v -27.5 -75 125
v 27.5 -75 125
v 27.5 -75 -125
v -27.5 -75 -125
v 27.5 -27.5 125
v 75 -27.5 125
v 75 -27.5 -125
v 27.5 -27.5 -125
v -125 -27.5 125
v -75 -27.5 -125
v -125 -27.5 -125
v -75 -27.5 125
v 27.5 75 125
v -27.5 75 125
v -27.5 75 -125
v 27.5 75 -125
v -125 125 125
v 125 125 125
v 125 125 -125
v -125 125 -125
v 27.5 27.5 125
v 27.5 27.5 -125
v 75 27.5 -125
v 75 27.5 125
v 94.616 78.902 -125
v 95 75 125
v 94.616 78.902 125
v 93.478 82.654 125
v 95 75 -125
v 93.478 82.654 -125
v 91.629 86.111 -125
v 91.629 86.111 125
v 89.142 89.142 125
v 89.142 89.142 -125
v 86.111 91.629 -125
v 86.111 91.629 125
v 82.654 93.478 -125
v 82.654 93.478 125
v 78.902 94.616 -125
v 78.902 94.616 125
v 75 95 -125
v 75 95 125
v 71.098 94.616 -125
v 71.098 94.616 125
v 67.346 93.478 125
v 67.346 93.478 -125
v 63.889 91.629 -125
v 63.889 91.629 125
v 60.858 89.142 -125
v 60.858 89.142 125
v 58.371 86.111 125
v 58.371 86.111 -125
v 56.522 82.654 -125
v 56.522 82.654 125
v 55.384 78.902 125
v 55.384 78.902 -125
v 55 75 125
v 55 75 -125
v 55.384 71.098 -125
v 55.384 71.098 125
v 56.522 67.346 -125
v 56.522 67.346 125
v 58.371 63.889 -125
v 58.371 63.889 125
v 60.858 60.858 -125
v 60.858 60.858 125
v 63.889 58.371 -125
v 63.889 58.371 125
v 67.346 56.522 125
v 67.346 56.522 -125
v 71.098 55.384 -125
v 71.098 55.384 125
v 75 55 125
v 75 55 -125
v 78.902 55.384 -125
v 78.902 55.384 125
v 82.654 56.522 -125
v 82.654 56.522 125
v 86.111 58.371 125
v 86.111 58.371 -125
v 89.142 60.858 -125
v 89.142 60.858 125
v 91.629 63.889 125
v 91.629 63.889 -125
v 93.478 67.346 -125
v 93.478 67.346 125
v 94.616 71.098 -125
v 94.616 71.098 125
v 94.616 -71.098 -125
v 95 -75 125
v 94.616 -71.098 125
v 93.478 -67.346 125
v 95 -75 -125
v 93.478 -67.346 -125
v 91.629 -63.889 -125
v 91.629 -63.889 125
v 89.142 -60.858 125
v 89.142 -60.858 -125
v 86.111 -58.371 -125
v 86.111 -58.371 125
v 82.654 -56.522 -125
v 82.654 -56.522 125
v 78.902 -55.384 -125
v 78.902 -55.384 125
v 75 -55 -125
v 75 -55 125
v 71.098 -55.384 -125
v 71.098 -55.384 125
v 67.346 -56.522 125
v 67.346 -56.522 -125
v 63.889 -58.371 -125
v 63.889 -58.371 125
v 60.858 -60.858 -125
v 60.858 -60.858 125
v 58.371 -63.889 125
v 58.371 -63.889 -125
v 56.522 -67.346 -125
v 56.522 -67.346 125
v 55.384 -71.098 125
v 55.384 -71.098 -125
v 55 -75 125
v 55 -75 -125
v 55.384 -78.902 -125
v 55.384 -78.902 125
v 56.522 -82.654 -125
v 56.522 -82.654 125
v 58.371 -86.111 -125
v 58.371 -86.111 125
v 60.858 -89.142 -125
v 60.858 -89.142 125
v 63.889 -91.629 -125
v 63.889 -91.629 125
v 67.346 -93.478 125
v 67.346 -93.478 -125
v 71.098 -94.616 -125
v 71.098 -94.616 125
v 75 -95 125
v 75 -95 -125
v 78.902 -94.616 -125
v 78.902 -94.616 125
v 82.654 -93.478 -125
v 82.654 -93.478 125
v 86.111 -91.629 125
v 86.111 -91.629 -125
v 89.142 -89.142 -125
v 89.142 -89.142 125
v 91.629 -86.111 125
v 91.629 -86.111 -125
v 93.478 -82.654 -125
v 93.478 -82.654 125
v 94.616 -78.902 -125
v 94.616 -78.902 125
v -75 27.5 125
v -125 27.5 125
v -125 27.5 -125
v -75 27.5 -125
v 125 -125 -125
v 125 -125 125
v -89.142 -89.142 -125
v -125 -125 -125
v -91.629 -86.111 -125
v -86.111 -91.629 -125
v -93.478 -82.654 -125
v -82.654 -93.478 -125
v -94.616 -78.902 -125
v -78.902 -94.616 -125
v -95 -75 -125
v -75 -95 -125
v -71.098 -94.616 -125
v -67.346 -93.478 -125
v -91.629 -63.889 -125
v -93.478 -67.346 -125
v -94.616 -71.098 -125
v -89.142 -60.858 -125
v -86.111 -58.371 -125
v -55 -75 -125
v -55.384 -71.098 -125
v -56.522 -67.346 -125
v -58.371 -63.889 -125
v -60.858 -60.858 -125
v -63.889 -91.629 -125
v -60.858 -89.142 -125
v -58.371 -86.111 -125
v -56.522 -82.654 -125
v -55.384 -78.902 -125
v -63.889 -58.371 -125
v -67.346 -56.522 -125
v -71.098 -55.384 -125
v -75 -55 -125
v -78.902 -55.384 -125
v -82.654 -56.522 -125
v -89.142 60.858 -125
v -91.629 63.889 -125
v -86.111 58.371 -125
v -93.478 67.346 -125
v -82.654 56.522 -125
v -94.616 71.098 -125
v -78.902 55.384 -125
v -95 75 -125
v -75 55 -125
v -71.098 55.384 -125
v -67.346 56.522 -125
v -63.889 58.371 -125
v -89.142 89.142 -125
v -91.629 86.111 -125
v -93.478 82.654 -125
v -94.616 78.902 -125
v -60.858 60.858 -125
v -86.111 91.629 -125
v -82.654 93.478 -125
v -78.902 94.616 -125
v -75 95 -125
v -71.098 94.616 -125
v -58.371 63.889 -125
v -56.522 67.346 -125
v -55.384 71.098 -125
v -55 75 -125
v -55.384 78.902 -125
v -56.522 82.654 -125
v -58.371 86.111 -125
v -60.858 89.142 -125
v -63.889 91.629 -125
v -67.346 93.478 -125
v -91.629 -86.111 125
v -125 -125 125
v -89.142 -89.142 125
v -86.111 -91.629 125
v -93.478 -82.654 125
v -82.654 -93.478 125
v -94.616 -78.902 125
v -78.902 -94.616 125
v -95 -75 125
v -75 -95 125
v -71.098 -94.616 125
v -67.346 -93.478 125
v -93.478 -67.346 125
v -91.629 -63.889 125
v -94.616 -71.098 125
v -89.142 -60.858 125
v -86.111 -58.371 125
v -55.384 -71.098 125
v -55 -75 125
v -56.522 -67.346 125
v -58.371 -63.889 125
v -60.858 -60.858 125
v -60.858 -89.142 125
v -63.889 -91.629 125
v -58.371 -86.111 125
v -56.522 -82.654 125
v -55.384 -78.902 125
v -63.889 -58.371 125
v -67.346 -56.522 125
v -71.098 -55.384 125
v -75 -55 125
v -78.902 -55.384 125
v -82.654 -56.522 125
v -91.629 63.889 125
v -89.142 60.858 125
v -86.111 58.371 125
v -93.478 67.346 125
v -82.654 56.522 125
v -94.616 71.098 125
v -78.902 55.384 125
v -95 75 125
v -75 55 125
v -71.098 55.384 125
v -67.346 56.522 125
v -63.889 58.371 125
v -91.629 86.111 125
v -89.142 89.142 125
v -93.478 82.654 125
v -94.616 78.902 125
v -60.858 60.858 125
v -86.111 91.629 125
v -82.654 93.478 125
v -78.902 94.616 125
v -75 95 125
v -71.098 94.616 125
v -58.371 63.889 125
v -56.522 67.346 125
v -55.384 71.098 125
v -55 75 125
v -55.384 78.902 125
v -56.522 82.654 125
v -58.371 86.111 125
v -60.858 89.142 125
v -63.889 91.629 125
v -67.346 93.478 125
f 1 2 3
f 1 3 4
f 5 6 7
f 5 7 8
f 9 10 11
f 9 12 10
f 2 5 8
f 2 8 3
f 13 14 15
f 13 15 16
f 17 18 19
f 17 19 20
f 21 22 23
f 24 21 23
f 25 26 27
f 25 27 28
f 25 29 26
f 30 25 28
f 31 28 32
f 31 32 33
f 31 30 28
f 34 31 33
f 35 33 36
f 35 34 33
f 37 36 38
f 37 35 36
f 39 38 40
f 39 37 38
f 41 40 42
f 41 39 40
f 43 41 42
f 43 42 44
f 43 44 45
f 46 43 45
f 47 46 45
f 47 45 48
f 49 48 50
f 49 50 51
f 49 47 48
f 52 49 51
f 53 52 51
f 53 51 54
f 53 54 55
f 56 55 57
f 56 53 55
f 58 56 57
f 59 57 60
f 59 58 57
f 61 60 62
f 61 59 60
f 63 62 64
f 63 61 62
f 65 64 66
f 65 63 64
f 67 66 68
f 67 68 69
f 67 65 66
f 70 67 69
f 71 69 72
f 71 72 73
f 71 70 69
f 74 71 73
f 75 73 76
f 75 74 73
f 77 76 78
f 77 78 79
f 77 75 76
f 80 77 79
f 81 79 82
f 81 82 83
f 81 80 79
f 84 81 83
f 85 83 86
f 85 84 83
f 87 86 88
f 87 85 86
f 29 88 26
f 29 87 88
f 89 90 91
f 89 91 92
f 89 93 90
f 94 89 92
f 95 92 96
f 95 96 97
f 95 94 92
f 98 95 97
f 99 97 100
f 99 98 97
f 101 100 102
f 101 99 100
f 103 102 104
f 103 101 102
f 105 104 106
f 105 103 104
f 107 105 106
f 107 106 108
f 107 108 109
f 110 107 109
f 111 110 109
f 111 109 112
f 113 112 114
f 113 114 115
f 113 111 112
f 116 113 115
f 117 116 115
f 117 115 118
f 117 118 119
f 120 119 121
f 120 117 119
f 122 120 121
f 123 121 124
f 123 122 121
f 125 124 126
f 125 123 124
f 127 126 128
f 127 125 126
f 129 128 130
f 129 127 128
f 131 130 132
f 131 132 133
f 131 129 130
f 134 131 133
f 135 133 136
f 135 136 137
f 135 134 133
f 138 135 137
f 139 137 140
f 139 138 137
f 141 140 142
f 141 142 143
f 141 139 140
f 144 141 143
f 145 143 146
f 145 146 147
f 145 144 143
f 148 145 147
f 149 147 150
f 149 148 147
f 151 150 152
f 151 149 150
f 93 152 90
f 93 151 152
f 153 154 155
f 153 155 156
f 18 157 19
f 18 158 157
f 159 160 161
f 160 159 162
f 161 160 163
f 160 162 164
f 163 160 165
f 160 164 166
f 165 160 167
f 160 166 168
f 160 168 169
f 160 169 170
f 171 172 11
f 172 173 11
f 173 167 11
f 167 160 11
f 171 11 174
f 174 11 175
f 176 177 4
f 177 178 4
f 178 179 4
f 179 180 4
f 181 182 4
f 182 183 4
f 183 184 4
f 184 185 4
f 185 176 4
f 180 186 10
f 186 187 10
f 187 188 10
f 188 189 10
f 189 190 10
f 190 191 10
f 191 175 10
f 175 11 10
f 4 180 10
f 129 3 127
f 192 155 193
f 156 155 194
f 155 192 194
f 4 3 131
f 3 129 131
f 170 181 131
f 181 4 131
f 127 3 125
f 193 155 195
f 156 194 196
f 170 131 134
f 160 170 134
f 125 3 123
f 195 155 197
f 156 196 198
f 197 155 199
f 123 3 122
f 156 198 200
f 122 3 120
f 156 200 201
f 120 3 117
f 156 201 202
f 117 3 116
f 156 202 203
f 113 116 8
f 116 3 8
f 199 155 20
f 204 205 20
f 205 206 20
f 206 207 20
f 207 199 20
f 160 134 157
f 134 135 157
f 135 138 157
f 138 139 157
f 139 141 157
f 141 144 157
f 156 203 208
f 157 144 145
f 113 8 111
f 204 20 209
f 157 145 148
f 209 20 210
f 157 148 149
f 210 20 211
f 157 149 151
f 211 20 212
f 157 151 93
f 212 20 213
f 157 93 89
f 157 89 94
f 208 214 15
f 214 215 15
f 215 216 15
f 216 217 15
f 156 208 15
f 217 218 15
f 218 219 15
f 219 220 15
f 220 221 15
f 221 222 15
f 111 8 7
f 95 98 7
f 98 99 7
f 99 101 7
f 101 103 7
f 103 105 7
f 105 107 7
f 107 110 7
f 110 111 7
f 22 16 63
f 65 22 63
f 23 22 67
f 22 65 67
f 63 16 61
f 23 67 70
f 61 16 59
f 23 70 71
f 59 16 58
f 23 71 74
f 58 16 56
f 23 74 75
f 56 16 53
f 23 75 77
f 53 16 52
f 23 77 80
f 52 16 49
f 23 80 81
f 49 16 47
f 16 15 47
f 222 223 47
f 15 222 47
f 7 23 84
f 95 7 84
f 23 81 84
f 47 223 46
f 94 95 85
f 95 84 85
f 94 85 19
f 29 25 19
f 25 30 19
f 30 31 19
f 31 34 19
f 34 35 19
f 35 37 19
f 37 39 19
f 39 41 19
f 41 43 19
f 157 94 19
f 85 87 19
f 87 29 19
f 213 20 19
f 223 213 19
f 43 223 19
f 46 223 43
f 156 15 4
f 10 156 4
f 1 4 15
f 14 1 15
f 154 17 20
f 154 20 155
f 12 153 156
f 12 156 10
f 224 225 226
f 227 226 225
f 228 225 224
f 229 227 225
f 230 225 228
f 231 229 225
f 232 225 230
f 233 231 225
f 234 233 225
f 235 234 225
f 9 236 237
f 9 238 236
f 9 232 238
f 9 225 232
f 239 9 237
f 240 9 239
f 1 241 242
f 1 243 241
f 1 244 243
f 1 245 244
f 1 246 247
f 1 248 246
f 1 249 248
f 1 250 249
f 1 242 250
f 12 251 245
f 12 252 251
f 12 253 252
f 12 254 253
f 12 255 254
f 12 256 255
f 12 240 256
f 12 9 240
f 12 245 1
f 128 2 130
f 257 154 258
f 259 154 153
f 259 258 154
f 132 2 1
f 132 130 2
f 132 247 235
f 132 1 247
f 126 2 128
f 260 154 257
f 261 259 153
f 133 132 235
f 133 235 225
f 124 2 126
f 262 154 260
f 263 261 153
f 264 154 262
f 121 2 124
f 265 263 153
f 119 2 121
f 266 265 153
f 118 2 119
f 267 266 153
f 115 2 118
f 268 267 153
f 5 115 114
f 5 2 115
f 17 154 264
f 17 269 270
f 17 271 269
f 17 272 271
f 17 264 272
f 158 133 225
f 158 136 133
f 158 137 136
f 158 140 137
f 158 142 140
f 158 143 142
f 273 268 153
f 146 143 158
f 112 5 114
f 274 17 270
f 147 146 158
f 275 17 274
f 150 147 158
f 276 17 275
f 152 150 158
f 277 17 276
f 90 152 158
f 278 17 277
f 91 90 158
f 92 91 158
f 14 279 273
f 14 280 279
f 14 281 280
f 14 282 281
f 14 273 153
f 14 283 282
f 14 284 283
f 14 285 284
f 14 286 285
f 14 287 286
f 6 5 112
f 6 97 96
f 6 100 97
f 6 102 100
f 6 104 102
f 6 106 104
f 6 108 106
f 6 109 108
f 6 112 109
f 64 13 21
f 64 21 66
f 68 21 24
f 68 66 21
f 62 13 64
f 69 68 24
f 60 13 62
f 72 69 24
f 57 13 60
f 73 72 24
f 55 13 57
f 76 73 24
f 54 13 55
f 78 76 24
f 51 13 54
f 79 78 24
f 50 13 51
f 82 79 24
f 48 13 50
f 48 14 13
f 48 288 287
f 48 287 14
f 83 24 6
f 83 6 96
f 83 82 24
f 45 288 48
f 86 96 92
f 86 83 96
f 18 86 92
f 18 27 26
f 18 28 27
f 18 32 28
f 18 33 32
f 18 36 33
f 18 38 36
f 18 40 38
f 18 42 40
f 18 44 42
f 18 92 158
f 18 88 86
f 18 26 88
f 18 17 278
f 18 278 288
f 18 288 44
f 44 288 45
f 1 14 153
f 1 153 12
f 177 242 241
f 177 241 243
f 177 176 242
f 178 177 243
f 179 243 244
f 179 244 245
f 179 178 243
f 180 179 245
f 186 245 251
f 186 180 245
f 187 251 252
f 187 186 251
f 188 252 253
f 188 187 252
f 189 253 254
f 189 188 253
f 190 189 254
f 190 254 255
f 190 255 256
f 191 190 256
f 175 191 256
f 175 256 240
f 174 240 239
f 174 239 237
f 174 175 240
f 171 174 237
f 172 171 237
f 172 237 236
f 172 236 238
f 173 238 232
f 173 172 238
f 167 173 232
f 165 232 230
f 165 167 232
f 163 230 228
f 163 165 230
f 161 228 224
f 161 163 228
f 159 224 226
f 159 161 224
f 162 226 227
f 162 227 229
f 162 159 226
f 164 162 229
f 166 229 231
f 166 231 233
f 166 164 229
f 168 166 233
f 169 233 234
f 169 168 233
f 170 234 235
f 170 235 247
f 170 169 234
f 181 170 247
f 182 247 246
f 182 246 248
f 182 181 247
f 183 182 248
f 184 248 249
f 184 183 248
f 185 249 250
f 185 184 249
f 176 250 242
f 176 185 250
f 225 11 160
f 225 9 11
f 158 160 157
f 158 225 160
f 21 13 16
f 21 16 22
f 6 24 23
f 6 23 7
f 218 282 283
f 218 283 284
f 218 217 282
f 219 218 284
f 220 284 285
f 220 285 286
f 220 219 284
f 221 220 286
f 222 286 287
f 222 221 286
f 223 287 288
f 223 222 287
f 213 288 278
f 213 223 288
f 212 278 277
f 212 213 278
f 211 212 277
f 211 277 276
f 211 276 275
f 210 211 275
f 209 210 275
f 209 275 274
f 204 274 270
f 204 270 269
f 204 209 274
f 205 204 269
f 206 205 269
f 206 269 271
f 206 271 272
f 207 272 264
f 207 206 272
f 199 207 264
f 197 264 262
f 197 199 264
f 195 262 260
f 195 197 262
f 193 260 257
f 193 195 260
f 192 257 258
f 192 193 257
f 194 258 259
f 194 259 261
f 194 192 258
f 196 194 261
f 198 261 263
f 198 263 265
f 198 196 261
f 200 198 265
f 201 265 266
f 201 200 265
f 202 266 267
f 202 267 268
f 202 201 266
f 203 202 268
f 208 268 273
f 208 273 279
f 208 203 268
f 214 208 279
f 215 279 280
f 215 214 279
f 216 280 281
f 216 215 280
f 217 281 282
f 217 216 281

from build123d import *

# Parameters (mm, degrees)
F0_R     = 20
F1_DEPTH = 125


with BuildPart() as f1:
    # F0 (on Top) → F1 (new body, symmetric)
    with BuildSketch(Plane.XY):
        Polygon((125, -125), (125, 125), (-125, 125), (-125, 27.5), (-75, 27.5), (-75, -27.5), (-125, -27.5), (-125, -125), align=None)
        with Locations((-75, -75)):
            Circle(F0_R, mode=Mode.SUBTRACT)
        with Locations((75, -75)):
            Circle(F0_R, mode=Mode.SUBTRACT)
        with Locations((-75, 75)):
            Circle(F0_R, mode=Mode.SUBTRACT)
        Polygon((-27.5, -75), (-27.5, 75), (27.5, 75), (27.5, 27.5), (75, 27.5), (75, -27.5), (27.5, -27.5), (27.5, -75), align=None, mode=Mode.SUBTRACT)
        with Locations((75, 75)):
            Circle(F0_R, mode=Mode.SUBTRACT)
    extrude(amount=F1_DEPTH, both=True)


solid = f1.part
